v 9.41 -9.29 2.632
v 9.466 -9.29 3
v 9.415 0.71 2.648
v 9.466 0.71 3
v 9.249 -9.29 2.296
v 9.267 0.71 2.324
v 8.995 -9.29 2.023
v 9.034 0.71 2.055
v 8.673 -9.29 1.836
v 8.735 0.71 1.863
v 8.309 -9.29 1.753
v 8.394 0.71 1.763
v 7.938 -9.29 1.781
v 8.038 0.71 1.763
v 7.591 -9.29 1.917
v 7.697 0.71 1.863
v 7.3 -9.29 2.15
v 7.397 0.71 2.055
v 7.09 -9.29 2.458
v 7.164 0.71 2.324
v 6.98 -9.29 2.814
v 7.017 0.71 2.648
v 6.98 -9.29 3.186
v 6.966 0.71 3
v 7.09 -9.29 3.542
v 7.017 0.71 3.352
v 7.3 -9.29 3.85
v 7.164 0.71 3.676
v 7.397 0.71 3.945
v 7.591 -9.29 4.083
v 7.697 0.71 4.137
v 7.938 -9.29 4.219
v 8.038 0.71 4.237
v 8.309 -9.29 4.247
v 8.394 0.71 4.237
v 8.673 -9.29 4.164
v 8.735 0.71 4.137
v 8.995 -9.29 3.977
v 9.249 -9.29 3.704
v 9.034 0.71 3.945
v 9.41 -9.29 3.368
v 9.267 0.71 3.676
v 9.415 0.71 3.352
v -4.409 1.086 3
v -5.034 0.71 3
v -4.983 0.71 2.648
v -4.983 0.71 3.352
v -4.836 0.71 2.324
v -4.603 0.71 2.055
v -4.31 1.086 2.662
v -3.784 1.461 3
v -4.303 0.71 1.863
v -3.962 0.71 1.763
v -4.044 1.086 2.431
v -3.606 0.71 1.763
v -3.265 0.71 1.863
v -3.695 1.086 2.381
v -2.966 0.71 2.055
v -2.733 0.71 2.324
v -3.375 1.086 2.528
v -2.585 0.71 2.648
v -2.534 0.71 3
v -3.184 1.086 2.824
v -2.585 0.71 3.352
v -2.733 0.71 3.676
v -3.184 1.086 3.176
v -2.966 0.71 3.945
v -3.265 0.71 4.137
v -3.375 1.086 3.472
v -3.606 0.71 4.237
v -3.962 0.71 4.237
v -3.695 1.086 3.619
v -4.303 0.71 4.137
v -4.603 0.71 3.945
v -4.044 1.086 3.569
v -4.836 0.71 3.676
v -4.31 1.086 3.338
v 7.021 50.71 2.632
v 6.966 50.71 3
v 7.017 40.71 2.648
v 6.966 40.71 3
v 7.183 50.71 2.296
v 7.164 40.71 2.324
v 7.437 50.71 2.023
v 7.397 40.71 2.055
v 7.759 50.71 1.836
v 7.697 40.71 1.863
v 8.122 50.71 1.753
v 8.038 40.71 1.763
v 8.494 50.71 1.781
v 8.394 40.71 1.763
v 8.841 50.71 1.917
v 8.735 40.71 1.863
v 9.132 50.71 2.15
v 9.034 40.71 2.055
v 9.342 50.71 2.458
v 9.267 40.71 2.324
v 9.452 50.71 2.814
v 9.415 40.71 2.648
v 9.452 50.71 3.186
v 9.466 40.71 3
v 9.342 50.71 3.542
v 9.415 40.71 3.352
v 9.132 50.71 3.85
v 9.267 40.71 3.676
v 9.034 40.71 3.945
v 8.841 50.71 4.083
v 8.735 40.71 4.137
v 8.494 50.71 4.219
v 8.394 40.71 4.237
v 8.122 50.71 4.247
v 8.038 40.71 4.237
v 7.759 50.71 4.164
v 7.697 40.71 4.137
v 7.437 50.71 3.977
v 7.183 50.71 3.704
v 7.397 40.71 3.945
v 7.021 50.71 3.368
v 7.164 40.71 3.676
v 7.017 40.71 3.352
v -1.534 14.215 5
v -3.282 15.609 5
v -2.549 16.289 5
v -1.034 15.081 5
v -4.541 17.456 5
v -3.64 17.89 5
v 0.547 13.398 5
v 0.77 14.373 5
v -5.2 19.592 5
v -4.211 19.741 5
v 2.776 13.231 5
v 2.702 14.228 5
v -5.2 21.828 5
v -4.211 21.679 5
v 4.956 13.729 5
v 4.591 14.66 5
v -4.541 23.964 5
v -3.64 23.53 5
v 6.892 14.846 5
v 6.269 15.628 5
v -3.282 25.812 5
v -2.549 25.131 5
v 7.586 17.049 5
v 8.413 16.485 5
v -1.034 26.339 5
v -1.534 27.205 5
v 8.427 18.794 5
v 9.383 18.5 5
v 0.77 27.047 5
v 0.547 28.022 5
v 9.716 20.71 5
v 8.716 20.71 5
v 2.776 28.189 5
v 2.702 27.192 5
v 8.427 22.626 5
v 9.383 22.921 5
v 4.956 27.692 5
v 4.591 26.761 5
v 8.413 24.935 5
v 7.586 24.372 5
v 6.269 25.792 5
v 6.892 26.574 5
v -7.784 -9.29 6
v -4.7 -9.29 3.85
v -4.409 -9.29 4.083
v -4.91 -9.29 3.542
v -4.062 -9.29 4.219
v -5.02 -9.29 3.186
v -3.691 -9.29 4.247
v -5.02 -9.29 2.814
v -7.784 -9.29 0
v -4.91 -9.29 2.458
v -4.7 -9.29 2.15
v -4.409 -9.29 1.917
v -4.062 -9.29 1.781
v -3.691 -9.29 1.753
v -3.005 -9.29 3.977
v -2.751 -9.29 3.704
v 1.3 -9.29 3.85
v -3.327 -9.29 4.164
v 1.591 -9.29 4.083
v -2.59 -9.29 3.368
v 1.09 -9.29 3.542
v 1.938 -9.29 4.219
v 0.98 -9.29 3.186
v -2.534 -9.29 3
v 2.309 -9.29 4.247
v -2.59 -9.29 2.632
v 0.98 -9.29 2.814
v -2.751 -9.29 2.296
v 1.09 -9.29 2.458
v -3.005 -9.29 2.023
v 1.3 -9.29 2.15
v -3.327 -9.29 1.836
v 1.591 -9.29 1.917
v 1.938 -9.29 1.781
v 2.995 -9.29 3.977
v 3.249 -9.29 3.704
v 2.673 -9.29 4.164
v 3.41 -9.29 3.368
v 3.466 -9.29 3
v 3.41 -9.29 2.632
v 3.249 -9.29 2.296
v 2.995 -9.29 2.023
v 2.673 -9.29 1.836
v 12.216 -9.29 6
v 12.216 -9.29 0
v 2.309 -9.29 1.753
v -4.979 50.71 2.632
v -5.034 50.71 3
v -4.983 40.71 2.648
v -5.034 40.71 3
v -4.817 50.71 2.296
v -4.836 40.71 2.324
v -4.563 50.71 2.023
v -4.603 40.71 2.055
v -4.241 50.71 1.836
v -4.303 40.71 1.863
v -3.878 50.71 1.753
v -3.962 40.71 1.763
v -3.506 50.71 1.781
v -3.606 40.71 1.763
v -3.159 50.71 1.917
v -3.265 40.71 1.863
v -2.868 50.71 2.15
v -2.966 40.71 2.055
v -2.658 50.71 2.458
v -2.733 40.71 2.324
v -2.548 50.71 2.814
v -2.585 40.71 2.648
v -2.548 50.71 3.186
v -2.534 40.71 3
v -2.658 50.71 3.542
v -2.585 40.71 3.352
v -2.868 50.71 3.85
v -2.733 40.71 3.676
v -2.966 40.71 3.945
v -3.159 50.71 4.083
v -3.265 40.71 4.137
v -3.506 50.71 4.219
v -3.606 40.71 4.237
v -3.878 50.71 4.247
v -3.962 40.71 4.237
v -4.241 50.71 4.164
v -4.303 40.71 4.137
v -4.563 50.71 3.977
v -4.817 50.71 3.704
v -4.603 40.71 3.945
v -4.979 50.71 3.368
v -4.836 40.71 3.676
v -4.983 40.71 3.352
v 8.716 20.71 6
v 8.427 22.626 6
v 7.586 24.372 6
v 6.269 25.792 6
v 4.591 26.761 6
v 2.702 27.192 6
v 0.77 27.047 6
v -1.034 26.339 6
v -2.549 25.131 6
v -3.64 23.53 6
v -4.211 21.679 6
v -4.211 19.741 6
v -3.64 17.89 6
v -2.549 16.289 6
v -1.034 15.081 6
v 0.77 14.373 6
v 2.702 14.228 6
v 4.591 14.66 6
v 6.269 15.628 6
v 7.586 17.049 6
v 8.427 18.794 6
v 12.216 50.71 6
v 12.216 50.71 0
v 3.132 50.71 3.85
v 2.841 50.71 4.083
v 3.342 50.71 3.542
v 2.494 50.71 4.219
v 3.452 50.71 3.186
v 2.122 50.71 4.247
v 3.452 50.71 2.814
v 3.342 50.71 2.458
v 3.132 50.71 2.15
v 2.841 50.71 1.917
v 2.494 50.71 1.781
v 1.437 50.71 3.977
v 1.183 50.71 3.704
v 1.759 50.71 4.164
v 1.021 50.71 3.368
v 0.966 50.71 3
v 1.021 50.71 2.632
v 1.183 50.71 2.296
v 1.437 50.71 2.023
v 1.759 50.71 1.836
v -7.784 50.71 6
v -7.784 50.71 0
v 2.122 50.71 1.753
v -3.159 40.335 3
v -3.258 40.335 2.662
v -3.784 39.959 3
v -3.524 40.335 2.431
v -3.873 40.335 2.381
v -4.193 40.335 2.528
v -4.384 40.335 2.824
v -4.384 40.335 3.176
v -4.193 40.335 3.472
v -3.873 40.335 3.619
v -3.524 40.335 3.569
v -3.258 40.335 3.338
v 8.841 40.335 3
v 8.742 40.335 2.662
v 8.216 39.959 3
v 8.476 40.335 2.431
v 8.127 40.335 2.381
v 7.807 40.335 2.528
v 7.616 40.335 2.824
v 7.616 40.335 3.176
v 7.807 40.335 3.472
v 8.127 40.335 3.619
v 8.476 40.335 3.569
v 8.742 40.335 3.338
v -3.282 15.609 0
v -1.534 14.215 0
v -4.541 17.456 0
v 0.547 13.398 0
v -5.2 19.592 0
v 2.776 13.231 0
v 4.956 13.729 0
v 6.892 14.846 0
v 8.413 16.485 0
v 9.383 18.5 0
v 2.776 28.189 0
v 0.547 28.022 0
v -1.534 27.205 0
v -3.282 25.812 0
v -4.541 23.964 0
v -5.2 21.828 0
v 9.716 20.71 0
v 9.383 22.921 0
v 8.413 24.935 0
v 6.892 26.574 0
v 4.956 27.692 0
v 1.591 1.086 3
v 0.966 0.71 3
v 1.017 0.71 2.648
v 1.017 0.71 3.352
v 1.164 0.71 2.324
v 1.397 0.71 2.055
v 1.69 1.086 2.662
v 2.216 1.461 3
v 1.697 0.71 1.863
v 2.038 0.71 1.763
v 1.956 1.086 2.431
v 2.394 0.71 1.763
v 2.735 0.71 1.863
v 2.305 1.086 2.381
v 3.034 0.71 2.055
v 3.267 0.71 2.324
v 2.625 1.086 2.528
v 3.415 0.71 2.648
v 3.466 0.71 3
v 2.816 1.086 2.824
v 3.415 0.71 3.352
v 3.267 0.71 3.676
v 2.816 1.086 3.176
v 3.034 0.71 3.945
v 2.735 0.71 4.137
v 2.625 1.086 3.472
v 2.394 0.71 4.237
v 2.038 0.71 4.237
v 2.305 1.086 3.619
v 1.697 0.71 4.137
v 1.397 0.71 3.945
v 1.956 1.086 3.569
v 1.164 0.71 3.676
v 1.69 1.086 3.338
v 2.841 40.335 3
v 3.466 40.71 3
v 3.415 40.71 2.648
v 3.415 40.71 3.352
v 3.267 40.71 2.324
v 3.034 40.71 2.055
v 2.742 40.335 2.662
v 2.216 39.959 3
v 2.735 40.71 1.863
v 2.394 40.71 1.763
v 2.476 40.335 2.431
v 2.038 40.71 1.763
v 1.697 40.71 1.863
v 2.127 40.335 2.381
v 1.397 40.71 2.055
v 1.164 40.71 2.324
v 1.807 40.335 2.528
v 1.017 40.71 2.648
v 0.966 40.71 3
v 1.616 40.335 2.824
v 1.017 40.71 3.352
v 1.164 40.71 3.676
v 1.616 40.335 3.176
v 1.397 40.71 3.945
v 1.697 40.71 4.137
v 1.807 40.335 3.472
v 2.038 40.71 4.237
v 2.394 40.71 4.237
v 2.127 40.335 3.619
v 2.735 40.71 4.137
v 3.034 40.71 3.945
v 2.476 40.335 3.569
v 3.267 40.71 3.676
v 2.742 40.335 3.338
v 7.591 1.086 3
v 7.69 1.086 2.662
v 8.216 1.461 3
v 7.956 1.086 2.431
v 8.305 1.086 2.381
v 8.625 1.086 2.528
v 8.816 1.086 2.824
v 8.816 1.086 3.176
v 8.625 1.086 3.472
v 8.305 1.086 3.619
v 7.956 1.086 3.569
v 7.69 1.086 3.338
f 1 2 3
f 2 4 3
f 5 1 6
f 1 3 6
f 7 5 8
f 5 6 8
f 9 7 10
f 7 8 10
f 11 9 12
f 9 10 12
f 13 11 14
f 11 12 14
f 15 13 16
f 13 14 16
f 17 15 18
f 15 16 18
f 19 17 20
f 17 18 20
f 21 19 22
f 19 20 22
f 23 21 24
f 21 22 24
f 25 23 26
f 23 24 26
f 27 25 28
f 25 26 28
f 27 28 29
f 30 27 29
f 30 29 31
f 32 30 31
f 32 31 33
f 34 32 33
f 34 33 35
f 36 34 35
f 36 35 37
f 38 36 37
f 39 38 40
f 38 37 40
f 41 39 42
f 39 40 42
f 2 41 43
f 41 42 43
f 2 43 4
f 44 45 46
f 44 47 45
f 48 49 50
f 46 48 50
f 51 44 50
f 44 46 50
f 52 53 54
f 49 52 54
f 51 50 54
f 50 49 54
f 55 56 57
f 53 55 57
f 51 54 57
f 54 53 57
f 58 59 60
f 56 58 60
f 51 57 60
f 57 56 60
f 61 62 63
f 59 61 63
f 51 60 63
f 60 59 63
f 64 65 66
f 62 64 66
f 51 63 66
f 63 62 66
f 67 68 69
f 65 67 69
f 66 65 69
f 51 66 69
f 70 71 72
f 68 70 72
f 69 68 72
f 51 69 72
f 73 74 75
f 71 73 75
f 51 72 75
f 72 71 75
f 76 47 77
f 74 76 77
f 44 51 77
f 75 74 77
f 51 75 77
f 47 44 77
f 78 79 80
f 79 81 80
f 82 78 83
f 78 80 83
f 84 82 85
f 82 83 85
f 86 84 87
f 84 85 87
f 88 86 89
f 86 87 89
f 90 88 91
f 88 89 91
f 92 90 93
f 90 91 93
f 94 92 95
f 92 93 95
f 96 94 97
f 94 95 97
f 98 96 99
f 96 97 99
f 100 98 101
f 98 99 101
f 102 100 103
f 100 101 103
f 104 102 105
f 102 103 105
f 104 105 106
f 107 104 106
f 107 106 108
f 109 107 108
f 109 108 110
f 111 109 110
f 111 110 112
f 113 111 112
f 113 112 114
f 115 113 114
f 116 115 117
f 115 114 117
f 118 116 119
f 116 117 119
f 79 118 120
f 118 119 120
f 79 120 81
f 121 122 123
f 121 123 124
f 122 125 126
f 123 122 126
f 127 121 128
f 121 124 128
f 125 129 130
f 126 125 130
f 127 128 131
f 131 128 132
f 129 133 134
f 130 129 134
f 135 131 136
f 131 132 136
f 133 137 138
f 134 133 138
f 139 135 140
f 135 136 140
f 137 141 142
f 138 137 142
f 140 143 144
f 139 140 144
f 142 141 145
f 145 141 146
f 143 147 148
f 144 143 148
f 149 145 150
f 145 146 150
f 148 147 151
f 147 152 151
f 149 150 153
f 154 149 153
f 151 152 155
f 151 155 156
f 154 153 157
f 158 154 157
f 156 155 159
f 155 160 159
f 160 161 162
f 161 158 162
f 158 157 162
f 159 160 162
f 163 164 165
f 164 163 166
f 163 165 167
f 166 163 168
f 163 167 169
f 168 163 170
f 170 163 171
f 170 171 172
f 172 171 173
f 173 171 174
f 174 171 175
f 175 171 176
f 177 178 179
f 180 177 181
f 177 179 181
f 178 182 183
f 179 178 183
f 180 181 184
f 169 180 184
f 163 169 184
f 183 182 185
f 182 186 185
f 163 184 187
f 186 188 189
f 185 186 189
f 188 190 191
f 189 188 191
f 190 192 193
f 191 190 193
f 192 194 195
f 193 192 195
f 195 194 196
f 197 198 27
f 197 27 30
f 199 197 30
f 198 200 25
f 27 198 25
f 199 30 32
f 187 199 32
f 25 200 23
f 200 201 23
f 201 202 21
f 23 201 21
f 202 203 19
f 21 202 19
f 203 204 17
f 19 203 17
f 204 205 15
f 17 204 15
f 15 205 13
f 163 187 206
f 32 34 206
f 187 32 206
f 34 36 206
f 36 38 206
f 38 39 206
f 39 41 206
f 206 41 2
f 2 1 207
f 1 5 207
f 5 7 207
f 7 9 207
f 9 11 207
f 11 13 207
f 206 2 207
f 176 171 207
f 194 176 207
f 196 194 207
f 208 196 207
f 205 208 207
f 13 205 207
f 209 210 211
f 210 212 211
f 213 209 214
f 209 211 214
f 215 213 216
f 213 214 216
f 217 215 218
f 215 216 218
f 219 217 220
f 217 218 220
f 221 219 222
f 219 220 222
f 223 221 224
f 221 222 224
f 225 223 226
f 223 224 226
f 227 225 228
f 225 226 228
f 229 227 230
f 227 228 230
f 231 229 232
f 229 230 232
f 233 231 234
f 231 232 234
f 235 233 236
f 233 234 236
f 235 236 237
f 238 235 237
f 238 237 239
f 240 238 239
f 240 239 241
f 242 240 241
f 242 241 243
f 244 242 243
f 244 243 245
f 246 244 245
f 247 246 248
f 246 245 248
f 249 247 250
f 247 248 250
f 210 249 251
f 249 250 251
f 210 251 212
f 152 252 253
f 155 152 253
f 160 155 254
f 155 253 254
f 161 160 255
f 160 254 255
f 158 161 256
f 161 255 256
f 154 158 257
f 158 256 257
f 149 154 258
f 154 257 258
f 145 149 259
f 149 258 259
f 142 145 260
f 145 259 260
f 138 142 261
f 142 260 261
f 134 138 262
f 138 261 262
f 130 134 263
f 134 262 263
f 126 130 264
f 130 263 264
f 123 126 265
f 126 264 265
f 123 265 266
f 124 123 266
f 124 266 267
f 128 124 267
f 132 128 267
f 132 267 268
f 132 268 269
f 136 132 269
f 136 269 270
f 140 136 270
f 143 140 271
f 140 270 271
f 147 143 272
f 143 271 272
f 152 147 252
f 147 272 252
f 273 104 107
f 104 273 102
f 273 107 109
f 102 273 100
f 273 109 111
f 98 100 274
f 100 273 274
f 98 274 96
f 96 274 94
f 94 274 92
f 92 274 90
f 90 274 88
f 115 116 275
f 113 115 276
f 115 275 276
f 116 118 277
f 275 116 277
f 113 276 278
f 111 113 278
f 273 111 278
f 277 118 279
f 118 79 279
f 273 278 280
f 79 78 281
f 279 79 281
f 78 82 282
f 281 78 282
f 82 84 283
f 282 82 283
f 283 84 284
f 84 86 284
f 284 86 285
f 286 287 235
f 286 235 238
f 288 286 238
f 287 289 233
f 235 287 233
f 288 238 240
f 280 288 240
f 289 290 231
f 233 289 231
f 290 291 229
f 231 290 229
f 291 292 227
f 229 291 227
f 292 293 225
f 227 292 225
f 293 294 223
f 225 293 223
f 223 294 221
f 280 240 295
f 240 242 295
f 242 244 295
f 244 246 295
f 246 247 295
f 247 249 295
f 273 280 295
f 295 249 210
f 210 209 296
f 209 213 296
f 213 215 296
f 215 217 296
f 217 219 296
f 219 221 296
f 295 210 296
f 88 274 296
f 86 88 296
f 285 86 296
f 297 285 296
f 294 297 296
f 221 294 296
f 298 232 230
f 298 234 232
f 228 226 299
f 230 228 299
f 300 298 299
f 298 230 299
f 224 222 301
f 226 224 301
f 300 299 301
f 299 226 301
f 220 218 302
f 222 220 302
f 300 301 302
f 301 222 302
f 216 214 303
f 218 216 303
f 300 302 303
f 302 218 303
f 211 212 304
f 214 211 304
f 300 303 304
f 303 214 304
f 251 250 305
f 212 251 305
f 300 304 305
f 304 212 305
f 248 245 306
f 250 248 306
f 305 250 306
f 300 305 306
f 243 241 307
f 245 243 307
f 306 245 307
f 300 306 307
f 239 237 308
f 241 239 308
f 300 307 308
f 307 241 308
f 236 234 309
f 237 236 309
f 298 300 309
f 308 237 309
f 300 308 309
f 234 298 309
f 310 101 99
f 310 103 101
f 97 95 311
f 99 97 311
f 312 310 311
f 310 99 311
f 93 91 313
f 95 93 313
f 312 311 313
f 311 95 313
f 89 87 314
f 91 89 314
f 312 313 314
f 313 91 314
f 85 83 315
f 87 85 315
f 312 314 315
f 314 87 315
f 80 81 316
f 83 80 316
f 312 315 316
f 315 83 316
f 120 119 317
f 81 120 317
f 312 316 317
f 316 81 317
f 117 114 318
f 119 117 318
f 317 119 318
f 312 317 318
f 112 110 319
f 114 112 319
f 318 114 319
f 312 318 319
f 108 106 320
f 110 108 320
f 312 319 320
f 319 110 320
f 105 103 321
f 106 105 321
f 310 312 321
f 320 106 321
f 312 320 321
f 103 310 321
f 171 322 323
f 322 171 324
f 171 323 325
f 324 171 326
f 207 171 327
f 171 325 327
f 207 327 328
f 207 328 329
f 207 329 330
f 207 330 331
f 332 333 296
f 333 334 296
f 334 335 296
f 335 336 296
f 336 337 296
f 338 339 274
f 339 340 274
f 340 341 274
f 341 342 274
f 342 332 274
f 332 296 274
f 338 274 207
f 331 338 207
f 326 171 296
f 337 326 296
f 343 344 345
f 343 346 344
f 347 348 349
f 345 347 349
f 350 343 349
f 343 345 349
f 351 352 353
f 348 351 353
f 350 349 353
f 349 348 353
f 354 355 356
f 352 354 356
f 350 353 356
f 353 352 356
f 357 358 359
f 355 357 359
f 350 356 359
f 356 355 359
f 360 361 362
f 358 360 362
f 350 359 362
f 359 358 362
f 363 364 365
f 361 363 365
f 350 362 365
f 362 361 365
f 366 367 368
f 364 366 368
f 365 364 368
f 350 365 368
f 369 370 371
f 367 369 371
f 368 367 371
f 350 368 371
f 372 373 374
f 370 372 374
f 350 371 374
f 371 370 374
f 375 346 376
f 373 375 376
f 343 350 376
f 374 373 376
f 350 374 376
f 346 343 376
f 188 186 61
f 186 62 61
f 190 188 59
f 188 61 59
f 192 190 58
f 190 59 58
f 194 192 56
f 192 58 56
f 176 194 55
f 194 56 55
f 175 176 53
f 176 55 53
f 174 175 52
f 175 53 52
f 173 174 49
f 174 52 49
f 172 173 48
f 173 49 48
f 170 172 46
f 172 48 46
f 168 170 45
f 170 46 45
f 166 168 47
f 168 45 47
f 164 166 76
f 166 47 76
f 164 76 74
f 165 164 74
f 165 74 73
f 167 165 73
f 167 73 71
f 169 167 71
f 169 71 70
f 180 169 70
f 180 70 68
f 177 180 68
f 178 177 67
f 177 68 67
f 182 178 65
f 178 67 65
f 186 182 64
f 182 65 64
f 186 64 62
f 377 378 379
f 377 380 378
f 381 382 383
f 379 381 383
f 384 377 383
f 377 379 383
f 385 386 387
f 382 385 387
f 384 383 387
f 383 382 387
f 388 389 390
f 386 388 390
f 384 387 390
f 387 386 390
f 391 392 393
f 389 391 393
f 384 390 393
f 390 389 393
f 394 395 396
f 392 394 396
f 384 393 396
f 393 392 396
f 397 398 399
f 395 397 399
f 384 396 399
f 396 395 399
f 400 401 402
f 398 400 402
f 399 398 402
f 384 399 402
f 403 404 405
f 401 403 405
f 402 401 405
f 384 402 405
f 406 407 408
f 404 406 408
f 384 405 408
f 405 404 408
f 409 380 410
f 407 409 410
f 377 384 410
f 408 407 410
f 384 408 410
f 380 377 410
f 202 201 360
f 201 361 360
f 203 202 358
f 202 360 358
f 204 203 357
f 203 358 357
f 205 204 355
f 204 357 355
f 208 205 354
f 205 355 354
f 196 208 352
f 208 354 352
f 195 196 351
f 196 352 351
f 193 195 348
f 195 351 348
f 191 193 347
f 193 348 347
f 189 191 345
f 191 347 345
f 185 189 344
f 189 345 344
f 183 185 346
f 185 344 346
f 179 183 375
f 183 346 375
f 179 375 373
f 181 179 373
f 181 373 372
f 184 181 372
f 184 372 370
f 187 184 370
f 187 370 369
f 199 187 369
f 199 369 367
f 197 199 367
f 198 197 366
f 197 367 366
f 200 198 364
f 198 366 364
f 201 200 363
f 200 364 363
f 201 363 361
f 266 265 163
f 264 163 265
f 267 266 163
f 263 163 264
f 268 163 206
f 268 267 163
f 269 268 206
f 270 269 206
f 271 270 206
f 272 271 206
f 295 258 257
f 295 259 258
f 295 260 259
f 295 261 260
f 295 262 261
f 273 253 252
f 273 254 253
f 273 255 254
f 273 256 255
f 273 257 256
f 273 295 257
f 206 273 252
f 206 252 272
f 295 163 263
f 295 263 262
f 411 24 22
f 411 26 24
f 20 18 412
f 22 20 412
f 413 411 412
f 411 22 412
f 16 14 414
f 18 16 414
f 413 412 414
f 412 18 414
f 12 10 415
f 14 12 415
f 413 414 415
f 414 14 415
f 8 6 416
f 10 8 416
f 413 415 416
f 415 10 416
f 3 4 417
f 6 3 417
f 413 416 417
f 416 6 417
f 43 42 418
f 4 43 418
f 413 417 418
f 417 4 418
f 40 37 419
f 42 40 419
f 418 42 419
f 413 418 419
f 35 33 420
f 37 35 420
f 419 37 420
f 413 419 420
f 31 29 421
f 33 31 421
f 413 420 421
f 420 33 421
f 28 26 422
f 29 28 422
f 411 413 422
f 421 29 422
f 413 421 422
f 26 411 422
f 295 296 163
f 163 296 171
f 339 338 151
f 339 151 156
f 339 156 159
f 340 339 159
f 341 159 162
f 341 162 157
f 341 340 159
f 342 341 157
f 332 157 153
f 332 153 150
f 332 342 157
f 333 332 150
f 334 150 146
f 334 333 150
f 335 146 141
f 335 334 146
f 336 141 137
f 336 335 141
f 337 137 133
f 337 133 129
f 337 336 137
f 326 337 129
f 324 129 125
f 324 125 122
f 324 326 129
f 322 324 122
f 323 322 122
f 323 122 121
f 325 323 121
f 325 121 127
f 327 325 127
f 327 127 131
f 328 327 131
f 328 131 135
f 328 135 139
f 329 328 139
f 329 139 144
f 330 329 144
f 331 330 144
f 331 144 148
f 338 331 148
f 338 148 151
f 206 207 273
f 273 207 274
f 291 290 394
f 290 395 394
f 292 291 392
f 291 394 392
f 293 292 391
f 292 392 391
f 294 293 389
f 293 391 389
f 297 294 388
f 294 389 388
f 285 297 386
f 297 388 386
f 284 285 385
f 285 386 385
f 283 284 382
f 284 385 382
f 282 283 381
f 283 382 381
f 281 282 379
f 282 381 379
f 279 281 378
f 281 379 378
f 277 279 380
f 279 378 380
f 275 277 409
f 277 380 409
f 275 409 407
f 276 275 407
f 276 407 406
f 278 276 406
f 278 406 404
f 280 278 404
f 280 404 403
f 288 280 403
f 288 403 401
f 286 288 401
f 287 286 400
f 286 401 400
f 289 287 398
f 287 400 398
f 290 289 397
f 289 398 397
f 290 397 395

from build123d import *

# Parameters (mm, degrees)
SKETCH_1_R             = 7.5
EXTRUDE_1_DEPTH        = 6
SKETCH_2_R             = 7.5
SKETCH_2_R_2           = 6.5
EXTRUDE_3_DEPTH        = 1
HOLE_WIZARD_M3_1_D     = 2.5
HOLE_WIZARD_M3_1_DEPTH = 10
HOLE_WIZARD_M3_1_TIP   = 0.751075774
HOLE_WIZARD_M3_2_D     = 2.5
HOLE_WIZARD_M3_2_DEPTH = 10
HOLE_WIZARD_M3_2_TIP   = 0.751075774


with BuildPart() as part:
    # 스케치1 → 보스-돌출1 (new body)
    with BuildSketch(Plane.XY):
        Polygon((-7.784090909, 20.710227273), (-7.784090909, -9.289772727), (12.215909091, -9.289772727), (12.215909091, 20.710227273), (12.215909091, 50.710227273), (-7.784090909, 50.710227273), align=None)
        with Locations((2.215909091, 20.710227273)):
            Circle(SKETCH_1_R, mode=Mode.SUBTRACT)
    extrude(amount=EXTRUDE_1_DEPTH)

    # 스케치2 → 보스-돌출3 (add)
    with BuildSketch(Plane.XY.offset(6)):
        with Locations((2.215909091, 20.710227273)):
            Circle(SKETCH_2_R)
        with Locations((2.215909091, 20.710227273)):
            Circle(SKETCH_2_R_2, mode=Mode.SUBTRACT)
    extrude(amount=-EXTRUDE_3_DEPTH)

    # M3 나사 구멍1
    with Locations(Plane(origin=(0, -9.289772727, 0), x_dir=(-1, 0, 0), z_dir=(0, -1, 0))):
        with Locations((3.784090909, -3), (-2.215909091, -3), (-8.215909091, -3)):
            Hole(HOLE_WIZARD_M3_1_D / 2, depth=HOLE_WIZARD_M3_1_DEPTH)
            with Locations((0, 0, -(HOLE_WIZARD_M3_1_DEPTH + HOLE_WIZARD_M3_1_TIP / 2))):  # 118° drill point
                Cone(0, HOLE_WIZARD_M3_1_D / 2, HOLE_WIZARD_M3_1_TIP, mode=Mode.SUBTRACT)

    # M3 나사 구멍2
    with Locations(Plane(origin=(0, 50.710227273, 0), x_dir=(1, 0, 0), z_dir=(0, 1, 0))):
        with Locations((-3.784090909, -3), (2.215909091, -3), (8.215909091, -3)):
            Hole(HOLE_WIZARD_M3_2_D / 2, depth=HOLE_WIZARD_M3_2_DEPTH)
            with Locations((0, 0, -(HOLE_WIZARD_M3_2_DEPTH + HOLE_WIZARD_M3_2_TIP / 2))):  # 118° drill point
                Cone(0, HOLE_WIZARD_M3_2_D / 2, HOLE_WIZARD_M3_2_TIP, mode=Mode.SUBTRACT)


solid = part.part
